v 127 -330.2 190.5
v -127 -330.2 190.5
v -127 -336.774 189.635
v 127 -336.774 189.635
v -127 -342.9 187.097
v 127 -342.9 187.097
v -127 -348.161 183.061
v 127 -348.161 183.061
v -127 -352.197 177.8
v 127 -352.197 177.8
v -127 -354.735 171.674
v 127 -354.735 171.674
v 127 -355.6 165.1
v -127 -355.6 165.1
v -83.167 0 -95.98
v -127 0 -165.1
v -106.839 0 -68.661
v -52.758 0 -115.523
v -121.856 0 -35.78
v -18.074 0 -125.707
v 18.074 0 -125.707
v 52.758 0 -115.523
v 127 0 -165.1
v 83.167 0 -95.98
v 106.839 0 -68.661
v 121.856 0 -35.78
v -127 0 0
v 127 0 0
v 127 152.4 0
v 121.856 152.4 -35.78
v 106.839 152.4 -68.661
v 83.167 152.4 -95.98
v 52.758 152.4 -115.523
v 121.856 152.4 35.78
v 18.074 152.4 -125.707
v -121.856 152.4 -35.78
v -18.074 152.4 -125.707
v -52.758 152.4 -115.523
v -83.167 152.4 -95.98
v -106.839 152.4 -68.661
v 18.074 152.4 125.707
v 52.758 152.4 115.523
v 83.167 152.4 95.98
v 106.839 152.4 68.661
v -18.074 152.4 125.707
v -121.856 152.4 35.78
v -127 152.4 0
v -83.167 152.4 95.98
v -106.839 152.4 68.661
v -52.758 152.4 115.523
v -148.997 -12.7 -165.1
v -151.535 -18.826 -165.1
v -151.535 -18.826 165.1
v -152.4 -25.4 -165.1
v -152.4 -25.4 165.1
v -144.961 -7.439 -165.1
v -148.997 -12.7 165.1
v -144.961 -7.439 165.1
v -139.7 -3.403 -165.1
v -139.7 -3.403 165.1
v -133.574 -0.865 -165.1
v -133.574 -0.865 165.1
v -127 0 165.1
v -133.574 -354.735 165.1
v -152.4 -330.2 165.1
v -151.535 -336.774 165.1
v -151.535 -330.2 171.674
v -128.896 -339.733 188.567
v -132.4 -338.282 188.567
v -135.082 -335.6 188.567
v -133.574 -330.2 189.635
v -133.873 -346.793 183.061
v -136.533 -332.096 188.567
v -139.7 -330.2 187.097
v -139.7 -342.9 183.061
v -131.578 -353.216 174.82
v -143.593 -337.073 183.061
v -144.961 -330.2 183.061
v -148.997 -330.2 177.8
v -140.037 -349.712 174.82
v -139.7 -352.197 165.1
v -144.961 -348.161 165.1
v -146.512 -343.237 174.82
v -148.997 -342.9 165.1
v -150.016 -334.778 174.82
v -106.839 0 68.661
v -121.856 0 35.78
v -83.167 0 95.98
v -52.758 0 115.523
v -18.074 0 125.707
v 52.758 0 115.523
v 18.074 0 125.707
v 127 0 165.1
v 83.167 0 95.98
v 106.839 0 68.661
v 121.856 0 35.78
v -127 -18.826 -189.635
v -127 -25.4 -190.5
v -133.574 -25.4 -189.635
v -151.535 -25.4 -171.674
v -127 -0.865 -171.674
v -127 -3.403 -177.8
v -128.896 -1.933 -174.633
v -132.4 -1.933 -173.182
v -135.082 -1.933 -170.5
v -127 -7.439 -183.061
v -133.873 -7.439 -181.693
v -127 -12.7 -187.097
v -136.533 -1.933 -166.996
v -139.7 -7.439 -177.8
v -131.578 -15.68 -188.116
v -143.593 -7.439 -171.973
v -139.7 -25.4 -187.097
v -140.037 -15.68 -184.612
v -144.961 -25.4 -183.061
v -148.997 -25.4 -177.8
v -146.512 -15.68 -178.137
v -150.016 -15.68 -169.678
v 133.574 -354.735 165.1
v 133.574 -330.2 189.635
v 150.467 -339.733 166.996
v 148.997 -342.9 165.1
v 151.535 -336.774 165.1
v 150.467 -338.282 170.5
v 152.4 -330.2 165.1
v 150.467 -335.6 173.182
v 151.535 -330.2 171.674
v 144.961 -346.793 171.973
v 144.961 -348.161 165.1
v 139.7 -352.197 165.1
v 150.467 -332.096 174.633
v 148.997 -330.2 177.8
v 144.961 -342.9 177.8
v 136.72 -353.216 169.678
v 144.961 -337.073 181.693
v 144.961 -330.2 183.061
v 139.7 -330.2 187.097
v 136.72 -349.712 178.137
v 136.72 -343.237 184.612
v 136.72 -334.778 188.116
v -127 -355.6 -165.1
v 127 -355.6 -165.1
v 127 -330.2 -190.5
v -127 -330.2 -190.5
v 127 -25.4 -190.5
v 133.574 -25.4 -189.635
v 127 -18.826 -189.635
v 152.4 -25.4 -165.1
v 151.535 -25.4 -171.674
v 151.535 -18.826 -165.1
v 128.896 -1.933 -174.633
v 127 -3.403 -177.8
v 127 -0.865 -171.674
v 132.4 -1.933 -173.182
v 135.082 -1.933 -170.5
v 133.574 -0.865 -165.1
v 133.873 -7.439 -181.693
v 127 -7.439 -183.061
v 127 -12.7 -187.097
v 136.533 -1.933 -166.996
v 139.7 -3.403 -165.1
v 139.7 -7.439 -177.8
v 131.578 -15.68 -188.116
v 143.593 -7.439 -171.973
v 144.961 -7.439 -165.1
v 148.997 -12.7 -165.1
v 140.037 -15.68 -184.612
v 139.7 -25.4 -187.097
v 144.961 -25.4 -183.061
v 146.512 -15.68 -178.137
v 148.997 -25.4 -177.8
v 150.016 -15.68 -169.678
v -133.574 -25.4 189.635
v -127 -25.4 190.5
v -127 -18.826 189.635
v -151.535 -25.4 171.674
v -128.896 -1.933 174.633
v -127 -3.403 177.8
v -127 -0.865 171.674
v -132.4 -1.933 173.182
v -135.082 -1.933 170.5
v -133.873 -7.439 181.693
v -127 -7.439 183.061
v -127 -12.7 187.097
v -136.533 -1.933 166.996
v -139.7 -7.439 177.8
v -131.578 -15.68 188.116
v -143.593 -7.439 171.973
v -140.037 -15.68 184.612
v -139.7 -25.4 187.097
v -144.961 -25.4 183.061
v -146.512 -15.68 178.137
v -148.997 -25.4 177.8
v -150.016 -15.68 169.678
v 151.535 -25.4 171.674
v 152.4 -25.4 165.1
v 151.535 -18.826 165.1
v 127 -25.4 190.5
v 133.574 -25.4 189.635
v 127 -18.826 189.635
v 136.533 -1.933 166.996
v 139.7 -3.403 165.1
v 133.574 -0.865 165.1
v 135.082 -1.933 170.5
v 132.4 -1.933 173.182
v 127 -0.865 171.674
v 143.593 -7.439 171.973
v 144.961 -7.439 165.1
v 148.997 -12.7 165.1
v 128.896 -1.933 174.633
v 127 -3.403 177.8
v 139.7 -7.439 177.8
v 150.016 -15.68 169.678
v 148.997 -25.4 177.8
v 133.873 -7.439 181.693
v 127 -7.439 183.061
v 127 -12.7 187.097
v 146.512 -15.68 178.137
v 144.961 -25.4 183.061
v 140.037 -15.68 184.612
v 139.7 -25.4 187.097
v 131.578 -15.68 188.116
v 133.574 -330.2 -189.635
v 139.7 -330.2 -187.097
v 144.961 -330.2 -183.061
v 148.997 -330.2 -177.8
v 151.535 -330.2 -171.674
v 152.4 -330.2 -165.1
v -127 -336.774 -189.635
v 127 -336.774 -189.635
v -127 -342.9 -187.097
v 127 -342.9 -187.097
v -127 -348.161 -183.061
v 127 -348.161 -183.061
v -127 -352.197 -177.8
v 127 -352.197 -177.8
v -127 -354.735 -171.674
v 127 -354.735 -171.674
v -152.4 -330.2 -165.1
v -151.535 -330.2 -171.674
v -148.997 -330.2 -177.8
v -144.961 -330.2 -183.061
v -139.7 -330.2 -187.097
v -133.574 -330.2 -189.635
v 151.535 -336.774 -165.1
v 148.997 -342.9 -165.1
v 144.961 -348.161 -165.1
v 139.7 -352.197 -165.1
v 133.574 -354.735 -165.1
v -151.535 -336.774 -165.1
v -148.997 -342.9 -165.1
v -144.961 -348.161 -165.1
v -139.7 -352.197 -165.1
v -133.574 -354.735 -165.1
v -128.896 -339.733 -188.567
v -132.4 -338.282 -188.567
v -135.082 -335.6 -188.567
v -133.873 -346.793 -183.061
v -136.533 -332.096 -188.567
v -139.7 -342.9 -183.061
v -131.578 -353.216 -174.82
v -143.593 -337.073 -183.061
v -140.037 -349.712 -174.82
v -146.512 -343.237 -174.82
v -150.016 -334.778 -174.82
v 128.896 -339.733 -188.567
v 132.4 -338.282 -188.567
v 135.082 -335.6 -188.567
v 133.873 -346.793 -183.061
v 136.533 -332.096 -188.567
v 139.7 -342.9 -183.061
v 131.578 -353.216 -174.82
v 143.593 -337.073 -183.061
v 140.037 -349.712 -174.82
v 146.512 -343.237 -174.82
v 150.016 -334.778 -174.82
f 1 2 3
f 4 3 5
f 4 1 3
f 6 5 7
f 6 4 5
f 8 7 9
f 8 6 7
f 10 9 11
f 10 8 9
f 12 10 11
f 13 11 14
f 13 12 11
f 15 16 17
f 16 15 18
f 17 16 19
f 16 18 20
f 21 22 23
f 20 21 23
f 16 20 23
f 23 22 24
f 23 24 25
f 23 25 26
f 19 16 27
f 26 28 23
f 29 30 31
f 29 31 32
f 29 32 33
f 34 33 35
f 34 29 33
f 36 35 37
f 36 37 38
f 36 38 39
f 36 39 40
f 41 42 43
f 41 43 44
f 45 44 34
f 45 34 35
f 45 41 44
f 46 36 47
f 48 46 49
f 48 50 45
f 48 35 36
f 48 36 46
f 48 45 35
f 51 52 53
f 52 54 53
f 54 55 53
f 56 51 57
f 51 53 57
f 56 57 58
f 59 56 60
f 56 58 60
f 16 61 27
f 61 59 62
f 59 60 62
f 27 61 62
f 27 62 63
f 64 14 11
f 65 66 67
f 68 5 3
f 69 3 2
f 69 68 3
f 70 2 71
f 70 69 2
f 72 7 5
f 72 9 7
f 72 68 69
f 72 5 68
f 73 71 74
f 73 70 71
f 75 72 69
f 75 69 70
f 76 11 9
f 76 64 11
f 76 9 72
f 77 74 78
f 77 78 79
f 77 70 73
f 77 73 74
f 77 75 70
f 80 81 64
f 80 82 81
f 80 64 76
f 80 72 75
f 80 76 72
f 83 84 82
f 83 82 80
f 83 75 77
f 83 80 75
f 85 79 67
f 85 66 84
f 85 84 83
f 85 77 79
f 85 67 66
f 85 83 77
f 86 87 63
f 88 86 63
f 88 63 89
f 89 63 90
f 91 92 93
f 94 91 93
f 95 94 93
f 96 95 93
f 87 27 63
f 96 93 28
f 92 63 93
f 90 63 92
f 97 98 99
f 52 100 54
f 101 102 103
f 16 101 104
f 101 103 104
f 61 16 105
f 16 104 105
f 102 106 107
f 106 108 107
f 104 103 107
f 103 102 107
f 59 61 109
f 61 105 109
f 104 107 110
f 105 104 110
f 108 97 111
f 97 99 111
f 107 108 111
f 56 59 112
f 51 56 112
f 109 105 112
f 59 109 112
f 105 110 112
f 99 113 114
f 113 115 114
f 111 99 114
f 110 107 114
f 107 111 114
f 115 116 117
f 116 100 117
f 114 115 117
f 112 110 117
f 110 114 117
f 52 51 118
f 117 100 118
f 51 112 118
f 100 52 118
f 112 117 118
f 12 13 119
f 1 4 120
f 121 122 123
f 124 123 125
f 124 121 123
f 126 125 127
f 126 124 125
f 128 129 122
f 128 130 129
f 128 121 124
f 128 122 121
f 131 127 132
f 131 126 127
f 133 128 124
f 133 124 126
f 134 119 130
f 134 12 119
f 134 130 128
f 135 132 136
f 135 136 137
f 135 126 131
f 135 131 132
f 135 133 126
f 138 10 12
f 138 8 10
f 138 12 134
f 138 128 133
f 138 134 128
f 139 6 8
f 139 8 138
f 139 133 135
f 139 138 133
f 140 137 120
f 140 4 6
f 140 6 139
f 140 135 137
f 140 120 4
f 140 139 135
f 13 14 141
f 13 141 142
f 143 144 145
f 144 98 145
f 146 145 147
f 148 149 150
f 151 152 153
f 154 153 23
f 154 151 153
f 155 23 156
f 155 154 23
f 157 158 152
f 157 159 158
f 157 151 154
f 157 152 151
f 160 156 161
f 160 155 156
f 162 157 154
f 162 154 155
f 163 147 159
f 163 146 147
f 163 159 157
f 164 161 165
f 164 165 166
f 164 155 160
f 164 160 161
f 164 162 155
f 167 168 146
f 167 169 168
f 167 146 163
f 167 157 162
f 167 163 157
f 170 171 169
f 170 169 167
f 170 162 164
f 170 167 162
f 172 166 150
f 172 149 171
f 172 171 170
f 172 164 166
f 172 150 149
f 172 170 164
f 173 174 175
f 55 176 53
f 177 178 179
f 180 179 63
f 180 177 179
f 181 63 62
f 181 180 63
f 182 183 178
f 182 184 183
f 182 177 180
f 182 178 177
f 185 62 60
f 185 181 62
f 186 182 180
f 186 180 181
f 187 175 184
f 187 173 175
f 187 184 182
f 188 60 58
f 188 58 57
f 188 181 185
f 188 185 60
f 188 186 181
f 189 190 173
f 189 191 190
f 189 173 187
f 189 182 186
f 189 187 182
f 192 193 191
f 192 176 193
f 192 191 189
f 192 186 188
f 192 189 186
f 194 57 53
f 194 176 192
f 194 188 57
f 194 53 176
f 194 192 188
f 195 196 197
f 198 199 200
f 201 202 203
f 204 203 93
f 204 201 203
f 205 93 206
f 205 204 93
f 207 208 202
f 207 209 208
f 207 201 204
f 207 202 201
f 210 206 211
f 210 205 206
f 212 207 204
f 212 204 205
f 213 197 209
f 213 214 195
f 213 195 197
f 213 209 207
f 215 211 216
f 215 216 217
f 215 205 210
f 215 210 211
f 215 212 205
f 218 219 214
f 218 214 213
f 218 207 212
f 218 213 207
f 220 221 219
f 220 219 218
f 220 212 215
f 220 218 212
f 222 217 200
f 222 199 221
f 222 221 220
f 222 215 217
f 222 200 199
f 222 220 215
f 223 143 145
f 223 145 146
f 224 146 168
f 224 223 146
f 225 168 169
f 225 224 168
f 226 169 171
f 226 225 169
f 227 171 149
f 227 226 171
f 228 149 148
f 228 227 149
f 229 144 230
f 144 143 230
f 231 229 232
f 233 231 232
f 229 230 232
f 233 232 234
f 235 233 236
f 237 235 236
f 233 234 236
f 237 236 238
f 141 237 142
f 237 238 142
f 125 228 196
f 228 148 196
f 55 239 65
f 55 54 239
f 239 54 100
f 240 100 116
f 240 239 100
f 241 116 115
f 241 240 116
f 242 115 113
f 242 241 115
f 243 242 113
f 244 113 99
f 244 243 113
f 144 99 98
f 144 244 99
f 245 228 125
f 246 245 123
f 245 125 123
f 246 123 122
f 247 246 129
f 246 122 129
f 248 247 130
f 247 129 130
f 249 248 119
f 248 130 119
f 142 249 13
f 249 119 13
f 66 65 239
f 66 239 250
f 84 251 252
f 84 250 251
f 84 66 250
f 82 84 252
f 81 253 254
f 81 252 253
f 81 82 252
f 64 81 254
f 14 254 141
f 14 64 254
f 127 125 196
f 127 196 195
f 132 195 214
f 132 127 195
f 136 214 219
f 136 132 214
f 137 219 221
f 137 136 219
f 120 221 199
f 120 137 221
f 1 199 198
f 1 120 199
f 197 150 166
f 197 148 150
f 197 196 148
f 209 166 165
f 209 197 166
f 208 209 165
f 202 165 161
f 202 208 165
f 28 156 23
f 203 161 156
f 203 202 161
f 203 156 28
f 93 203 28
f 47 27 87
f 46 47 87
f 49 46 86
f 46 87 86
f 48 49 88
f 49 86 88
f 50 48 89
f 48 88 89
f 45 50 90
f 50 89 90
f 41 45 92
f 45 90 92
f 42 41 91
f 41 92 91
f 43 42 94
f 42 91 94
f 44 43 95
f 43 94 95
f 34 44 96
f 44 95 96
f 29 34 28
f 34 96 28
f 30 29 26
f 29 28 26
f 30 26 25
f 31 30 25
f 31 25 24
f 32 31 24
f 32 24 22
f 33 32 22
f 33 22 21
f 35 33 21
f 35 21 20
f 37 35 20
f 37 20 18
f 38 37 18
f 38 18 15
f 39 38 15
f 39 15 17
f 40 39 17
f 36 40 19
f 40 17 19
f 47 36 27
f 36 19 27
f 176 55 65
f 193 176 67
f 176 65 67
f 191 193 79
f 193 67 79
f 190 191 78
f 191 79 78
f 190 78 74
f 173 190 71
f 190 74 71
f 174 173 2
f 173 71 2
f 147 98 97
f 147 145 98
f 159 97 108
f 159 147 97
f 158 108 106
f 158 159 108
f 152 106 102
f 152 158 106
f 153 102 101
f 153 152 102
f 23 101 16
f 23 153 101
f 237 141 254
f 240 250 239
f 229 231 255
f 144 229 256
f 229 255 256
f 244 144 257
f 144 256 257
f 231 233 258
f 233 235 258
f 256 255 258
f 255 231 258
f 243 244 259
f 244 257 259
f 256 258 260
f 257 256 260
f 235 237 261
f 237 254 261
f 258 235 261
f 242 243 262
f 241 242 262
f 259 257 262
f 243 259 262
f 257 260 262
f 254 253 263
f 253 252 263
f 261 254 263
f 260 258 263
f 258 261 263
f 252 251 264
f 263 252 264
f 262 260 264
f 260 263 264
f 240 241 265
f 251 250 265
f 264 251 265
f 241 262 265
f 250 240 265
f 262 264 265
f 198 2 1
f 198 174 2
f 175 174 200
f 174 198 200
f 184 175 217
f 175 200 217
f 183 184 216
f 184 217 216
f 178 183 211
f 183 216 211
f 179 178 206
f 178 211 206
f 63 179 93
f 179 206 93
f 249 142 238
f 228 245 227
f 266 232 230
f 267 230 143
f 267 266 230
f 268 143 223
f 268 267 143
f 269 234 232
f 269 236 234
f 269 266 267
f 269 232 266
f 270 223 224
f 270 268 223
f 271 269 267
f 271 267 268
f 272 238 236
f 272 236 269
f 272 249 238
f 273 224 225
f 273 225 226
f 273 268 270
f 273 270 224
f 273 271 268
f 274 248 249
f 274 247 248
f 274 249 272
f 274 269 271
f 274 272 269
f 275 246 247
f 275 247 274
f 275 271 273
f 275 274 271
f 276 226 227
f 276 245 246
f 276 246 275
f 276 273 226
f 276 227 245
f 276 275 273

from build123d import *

# Parameters (mm, degrees)
F0_W     = 304.8
F0_H     = 381
F1_DEPTH = 355.6
F2_R     = 25.4
F3_R     = 127
F4_DEPTH = 152.4


with BuildPart() as f1:
    # F0 (on Front) → F1 (new body)
    with BuildSketch(Plane.XZ):
        Rectangle(F0_W, F0_H)
    extrude(amount=F1_DEPTH)

    # F2
    f2_edges = [f1.edges().sort_by_distance(p)[0] for p in [
        (-152.4, -355.6, 0),
        (0, -355.6, 190.5),
        (152.4, -355.6, 0),
        (0, -355.6, -190.5),
        (-152.4, -177.8, -190.5),
        (-152.4, -177.8, 190.5),
        (152.4, -177.8, 190.5),
        (152.4, -177.8, -190.5),
        (0, 0, -190.5),
        (152.4, 0, 0),
        (0, 0, 190.5),
        (-152.4, 0, 0),
    ]]
    fillet(f2_edges, radius=F2_R)

    # F3 (on face) → F4 (join)
    with BuildSketch(Plane(origin=(0, 0, 0), x_dir=(-1, 0, 0), z_dir=(0, 1, 0))):
        Circle(F3_R)
    extrude(amount=F4_DEPTH)


solid = f1.part
